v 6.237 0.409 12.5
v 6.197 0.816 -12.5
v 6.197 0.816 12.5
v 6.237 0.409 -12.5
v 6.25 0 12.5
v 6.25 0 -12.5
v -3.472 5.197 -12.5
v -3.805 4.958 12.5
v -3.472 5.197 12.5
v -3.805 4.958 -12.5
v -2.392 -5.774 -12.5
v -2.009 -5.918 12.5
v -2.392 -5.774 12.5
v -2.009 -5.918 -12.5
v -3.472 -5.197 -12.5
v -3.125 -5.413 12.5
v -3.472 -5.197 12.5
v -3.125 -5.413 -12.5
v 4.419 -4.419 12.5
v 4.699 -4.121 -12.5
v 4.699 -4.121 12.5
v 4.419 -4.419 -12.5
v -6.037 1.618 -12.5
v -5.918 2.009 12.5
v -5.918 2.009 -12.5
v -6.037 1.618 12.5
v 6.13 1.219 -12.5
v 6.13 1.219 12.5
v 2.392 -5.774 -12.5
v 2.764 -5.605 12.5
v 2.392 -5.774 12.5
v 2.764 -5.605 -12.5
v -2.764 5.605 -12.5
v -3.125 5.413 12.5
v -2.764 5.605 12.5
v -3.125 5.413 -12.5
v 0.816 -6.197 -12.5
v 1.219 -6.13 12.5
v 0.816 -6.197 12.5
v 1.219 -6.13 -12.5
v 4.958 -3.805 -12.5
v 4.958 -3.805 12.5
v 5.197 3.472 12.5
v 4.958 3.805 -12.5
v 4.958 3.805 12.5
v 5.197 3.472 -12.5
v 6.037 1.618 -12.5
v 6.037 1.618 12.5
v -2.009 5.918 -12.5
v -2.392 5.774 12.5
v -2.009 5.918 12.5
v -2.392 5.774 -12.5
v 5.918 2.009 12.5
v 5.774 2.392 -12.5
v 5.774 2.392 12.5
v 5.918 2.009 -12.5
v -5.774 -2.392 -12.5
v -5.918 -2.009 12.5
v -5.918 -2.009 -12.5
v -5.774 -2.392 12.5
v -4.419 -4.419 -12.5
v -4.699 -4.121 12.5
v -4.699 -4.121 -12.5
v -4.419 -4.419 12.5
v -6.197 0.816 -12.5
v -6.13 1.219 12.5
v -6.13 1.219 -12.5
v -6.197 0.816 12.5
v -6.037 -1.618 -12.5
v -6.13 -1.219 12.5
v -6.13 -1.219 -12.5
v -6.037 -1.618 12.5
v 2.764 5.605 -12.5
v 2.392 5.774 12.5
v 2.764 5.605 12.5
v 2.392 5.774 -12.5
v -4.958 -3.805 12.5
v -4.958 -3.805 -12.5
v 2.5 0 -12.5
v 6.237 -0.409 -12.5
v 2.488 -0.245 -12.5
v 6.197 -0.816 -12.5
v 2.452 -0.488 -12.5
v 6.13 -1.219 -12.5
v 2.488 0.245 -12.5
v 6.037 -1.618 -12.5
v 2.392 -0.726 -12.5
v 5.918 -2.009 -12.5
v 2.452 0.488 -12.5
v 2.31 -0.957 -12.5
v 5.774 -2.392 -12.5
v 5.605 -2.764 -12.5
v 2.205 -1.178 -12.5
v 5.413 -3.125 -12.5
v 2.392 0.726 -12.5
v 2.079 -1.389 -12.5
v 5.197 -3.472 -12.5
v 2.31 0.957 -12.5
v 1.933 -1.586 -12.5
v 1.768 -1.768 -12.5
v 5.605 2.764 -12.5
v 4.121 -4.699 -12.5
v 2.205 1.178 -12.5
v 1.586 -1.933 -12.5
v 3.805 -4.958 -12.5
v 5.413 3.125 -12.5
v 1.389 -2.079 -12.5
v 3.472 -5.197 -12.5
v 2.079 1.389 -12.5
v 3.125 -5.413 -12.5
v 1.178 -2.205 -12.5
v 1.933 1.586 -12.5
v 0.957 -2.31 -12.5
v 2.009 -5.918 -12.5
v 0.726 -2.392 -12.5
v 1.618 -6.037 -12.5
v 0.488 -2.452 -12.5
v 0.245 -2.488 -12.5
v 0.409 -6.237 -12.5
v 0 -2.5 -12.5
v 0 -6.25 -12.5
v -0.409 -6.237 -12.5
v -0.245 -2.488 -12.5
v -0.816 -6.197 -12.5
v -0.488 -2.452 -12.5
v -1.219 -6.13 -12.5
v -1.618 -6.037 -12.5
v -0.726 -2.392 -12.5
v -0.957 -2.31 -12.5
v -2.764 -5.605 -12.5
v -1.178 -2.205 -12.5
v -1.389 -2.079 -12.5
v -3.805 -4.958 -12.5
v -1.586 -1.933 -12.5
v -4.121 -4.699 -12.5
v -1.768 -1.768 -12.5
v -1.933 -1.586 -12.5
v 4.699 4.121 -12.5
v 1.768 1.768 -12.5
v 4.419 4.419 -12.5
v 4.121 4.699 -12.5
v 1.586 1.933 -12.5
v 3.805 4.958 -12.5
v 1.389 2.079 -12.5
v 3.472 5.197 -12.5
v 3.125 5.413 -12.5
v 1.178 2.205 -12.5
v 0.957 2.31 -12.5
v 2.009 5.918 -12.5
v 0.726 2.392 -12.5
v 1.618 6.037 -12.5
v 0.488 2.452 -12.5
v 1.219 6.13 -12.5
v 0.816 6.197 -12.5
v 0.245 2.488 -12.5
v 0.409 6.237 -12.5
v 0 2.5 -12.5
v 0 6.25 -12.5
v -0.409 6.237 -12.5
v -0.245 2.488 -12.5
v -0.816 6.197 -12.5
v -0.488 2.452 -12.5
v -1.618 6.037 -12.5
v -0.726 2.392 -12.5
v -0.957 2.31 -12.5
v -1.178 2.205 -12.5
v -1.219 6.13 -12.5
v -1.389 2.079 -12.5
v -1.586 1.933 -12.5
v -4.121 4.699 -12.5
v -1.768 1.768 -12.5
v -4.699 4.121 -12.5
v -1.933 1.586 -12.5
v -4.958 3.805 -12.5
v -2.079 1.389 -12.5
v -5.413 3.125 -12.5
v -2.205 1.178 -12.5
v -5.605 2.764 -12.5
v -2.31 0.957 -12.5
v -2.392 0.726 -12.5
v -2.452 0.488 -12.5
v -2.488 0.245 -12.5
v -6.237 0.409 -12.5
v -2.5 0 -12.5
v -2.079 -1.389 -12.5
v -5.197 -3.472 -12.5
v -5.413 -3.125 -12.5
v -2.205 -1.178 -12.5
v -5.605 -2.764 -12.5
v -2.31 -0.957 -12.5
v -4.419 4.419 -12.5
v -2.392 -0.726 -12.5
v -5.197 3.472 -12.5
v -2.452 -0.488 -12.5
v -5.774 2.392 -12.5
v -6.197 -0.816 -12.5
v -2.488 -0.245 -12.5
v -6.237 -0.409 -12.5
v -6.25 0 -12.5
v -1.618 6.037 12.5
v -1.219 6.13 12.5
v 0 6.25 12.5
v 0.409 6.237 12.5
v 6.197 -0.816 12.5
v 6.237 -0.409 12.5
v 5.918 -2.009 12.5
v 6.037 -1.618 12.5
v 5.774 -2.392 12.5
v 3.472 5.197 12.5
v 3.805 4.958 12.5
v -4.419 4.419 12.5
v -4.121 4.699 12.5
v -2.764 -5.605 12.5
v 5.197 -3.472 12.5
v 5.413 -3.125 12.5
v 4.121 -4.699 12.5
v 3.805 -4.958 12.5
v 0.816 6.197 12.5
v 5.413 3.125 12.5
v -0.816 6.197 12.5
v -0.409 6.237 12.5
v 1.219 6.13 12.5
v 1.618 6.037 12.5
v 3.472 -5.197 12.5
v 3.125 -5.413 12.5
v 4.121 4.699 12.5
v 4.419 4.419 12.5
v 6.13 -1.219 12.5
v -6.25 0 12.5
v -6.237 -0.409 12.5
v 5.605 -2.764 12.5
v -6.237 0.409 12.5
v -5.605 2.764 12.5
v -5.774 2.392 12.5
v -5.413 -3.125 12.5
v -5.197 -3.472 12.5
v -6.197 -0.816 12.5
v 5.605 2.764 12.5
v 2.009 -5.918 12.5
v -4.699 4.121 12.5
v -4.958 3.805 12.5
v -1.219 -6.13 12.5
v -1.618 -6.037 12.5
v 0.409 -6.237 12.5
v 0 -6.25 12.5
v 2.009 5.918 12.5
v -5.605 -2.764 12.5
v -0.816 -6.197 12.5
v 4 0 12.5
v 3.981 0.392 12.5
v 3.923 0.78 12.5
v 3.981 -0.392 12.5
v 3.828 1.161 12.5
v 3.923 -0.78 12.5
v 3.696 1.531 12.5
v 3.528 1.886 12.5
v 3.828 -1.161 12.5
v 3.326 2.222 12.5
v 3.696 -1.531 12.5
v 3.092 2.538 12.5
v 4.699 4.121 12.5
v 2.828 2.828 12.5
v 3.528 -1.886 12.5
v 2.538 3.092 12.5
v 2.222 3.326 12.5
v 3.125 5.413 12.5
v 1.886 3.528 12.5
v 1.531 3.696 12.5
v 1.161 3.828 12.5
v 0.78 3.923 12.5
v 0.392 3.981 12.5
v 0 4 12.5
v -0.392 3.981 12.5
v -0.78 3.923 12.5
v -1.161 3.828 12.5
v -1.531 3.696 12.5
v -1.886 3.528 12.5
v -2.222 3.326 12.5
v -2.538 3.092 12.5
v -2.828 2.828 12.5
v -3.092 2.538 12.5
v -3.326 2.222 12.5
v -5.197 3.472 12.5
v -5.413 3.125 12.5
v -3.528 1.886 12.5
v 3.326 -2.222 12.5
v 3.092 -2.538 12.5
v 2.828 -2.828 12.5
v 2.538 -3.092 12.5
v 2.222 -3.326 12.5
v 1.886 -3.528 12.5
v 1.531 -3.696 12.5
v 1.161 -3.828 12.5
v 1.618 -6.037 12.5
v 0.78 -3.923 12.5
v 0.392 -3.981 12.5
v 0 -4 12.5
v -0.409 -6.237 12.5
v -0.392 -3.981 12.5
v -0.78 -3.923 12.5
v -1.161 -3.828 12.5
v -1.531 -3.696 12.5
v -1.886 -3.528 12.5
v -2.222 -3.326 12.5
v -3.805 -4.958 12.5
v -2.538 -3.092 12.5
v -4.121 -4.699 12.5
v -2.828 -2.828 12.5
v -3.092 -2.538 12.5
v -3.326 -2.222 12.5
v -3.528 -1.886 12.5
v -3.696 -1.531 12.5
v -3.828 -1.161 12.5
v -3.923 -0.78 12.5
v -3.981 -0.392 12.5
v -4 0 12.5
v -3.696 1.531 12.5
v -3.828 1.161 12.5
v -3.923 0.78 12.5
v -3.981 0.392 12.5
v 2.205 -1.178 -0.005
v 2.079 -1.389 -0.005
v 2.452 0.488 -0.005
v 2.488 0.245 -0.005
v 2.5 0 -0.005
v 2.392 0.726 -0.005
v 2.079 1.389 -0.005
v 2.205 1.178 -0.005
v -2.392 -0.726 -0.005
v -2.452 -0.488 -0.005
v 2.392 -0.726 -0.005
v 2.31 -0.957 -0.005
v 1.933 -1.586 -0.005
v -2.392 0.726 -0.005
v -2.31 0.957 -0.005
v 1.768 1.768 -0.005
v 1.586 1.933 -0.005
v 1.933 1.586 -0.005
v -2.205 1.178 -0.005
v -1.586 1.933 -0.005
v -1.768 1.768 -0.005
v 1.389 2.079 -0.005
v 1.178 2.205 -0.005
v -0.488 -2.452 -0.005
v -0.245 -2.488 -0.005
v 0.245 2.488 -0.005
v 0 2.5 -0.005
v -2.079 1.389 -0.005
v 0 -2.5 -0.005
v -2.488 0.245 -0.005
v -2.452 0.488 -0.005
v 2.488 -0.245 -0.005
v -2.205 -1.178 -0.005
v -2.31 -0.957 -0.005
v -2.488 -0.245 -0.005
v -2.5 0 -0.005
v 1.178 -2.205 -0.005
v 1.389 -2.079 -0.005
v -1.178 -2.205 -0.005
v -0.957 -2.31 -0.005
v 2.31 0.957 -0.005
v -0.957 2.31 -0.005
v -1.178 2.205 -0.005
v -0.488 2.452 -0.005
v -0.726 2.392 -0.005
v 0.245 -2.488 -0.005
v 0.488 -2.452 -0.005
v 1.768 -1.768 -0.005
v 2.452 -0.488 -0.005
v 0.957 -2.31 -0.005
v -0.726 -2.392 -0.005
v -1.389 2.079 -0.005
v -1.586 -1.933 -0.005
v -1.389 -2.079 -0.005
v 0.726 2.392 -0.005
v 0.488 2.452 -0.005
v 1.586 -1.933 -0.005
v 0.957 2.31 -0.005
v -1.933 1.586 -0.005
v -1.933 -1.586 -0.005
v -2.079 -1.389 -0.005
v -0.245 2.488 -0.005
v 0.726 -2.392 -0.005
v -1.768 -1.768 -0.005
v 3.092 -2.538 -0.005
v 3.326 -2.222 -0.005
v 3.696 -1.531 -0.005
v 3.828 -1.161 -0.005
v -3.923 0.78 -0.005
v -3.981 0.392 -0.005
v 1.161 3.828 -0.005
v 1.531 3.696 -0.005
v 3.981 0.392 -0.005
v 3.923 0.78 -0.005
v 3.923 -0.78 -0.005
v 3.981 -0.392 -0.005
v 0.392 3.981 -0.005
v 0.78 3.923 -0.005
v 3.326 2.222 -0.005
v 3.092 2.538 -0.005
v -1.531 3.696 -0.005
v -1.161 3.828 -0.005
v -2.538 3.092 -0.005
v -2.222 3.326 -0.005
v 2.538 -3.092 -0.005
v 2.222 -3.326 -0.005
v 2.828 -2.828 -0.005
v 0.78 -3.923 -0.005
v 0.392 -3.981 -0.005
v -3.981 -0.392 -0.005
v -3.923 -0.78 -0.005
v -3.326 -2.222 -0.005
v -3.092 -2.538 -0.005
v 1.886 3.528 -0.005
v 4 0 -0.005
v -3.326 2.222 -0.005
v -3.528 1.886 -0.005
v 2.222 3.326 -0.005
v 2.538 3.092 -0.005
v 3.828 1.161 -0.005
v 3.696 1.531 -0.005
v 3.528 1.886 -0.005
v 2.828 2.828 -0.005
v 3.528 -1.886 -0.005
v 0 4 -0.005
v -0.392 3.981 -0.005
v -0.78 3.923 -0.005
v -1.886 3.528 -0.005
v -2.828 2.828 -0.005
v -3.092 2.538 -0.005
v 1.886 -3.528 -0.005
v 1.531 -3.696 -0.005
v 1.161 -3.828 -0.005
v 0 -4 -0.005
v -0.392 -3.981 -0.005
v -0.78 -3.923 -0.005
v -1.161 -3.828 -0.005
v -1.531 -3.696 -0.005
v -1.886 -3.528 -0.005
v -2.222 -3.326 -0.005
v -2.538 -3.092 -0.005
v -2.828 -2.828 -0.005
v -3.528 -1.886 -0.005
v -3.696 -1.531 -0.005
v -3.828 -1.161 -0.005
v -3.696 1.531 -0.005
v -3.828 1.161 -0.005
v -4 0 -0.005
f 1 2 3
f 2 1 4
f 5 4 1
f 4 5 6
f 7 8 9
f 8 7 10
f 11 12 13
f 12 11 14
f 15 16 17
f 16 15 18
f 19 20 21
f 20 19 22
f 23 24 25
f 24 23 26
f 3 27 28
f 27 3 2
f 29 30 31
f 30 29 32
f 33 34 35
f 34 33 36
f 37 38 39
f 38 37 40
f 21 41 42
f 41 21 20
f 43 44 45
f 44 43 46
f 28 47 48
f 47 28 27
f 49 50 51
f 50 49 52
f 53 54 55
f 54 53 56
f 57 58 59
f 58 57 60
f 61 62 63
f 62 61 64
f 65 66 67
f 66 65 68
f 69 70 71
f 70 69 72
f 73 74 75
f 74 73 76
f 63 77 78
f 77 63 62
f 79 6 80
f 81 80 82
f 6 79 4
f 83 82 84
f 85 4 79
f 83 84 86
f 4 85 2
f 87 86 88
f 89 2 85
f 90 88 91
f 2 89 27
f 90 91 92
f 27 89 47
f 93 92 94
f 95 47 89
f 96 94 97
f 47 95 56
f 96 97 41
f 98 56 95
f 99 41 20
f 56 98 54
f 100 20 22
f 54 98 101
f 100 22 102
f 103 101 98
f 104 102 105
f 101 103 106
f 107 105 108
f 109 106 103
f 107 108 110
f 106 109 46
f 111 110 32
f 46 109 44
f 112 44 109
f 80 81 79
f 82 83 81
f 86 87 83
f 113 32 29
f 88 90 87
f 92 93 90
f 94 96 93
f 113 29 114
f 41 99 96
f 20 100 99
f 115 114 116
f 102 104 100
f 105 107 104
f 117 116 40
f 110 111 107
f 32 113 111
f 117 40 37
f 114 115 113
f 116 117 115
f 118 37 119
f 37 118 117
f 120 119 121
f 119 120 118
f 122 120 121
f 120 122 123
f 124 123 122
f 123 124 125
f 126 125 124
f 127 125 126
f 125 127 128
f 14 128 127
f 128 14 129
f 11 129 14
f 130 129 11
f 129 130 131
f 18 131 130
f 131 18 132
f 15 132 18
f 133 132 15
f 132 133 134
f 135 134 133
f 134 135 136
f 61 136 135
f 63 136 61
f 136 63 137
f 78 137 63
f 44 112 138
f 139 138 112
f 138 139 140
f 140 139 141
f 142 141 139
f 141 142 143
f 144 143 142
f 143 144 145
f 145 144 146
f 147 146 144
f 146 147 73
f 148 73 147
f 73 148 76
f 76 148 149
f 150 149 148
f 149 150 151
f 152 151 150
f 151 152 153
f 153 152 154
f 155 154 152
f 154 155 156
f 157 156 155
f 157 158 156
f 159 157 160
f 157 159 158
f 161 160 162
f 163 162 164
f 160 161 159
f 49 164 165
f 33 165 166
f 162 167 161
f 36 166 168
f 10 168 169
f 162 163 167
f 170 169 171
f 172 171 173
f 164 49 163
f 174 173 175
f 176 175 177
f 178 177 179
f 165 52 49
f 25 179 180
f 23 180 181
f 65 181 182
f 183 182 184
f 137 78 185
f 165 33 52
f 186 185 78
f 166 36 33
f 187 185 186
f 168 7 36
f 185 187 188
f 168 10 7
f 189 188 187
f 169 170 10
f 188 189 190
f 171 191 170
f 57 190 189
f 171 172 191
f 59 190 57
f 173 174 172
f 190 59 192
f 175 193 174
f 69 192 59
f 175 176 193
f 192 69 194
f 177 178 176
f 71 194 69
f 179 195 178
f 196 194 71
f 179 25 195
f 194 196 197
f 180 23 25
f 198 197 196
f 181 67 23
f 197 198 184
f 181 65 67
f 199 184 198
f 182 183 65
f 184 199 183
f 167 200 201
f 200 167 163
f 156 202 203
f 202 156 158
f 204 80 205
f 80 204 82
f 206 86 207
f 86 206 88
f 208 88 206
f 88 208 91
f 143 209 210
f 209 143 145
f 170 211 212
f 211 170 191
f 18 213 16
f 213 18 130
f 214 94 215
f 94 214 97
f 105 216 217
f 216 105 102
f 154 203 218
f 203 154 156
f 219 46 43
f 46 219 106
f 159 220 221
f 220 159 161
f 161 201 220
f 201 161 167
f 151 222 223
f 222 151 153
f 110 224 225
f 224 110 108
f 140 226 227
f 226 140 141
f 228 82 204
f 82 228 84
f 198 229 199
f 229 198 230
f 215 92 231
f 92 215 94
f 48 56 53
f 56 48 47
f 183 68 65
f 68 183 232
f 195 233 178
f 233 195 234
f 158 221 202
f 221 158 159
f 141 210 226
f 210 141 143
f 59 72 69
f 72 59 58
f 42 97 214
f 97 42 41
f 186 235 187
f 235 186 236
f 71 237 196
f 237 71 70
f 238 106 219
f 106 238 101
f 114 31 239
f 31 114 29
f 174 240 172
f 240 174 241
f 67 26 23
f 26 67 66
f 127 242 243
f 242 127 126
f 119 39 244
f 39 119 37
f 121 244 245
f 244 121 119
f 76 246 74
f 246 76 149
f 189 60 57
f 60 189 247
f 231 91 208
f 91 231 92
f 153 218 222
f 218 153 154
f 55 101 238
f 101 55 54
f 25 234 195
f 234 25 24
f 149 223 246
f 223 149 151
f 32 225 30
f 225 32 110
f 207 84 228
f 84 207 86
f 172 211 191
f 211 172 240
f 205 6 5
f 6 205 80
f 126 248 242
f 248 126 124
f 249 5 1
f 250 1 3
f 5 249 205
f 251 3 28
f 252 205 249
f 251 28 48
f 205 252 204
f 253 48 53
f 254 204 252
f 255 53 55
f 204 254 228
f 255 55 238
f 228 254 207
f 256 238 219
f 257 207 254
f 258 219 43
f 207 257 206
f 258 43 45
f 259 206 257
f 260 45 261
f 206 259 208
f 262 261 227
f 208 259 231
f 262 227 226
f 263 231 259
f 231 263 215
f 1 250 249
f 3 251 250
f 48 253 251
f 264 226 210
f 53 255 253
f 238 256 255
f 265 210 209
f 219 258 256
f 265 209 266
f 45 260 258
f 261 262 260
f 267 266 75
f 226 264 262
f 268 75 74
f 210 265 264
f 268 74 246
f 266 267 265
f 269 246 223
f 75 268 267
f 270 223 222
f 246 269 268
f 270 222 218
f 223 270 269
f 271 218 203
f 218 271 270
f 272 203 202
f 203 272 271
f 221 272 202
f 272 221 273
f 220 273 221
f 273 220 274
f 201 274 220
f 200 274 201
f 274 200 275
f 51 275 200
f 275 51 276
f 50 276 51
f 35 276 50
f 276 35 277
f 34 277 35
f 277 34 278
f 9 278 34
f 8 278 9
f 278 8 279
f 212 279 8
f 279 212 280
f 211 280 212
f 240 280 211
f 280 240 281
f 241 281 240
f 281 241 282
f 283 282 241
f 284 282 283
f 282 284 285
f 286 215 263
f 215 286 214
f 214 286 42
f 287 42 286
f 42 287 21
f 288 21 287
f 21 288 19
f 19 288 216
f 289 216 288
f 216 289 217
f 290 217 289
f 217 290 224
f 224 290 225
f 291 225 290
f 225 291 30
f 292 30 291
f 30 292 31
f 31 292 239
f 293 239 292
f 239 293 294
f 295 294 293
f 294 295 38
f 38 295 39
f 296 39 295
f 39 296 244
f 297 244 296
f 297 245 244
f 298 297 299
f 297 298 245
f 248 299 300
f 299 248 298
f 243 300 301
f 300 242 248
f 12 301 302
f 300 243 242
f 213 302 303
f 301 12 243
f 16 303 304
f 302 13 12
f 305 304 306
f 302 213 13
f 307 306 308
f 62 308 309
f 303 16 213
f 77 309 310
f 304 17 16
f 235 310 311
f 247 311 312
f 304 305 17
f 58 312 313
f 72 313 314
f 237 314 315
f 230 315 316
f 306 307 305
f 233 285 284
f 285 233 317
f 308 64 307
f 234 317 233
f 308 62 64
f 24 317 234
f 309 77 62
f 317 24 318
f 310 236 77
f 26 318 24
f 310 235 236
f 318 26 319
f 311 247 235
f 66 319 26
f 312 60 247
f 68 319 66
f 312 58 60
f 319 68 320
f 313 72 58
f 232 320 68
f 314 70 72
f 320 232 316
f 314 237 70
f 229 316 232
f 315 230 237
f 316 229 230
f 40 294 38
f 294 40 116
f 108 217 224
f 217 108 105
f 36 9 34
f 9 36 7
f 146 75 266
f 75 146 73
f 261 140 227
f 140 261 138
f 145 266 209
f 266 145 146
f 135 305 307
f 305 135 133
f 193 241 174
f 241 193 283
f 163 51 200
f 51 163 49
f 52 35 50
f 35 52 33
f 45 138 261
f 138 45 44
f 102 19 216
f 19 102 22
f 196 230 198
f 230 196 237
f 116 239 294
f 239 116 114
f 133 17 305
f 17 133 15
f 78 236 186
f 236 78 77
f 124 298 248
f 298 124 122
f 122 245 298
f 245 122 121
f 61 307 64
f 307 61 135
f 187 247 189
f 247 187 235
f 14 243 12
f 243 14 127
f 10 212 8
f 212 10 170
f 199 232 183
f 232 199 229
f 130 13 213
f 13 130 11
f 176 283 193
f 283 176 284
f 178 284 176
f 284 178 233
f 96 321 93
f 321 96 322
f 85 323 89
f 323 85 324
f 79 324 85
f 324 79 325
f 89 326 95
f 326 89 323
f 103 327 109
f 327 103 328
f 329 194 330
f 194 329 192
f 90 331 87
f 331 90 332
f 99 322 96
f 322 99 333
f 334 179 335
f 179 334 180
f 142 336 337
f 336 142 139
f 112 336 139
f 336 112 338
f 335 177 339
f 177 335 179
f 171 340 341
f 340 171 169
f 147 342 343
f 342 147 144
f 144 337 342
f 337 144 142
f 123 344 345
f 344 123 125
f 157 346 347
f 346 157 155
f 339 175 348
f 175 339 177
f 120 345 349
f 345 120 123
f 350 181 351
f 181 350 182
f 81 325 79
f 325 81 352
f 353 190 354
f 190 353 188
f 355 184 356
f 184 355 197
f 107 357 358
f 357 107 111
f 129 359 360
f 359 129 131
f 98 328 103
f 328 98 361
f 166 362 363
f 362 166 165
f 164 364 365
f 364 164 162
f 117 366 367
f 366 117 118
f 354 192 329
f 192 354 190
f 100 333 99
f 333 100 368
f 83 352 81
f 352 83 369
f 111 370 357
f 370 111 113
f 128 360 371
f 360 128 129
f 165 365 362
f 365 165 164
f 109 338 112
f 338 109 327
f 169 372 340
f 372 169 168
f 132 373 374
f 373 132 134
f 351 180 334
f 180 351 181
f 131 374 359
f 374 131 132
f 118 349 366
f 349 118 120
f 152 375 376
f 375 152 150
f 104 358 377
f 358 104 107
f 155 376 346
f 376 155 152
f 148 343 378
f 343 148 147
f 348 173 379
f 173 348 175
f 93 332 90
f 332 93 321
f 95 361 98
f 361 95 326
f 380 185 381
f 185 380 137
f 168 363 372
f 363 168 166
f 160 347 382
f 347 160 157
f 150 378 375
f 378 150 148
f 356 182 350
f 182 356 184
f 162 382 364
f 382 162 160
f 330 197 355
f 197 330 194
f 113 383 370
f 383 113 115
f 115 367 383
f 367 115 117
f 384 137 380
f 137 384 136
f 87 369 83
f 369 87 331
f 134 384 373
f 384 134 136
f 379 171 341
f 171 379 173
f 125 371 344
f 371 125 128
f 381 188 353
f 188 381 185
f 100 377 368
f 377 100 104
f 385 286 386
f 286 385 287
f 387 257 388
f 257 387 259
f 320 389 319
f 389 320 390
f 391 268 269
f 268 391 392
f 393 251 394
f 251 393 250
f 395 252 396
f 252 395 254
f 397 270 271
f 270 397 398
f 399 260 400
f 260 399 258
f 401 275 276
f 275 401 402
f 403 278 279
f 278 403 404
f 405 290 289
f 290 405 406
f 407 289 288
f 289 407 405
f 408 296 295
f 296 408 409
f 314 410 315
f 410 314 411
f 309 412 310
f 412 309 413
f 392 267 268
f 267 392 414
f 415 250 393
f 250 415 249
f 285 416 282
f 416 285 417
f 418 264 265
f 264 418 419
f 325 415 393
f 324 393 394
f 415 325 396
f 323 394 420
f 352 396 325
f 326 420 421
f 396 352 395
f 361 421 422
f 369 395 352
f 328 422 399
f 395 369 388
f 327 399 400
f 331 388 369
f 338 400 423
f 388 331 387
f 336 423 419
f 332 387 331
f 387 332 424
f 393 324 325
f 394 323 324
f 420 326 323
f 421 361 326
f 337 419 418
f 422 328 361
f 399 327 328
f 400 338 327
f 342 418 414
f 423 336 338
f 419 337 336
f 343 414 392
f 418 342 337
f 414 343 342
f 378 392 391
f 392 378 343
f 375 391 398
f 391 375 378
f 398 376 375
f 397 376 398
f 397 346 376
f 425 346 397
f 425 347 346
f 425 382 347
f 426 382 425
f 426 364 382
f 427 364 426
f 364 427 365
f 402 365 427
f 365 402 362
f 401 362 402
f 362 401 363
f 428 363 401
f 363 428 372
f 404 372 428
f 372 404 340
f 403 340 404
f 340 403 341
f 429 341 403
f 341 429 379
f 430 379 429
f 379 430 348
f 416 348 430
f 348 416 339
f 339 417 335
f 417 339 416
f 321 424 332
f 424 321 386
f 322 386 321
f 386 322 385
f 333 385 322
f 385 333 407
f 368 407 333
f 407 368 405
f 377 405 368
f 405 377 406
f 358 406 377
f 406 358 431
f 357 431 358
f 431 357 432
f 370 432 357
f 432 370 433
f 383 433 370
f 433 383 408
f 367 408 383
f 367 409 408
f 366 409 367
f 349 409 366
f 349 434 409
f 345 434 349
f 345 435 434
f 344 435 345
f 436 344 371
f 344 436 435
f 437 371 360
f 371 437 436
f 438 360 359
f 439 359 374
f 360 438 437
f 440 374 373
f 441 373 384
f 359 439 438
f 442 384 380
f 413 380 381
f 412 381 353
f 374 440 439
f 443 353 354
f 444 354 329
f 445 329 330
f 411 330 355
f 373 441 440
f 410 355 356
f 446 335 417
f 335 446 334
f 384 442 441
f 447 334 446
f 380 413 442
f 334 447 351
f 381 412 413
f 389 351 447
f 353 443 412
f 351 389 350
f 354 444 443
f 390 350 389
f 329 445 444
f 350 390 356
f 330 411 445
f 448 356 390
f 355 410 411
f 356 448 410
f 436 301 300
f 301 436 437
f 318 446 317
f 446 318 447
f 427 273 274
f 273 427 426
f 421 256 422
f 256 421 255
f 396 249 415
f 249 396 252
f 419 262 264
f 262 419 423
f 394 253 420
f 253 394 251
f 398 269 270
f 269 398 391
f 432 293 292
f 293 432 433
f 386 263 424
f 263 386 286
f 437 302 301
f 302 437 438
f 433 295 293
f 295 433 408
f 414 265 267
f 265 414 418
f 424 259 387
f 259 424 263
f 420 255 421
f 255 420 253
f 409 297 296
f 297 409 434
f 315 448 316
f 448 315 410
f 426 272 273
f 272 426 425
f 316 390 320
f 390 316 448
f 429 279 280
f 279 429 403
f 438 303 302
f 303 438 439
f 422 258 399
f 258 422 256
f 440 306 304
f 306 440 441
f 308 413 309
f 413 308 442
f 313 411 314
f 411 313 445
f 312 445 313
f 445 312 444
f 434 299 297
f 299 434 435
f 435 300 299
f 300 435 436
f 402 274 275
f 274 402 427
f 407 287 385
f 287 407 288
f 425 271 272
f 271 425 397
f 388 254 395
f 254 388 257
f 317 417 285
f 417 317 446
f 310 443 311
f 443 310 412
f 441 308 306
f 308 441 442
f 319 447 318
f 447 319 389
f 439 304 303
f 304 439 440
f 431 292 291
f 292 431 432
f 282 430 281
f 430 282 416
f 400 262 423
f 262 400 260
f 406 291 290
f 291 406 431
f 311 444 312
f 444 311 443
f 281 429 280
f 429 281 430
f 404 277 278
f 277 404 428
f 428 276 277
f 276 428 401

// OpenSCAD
// Rigid shaft coupling: 5.0mm to 8.0mm bore, 12.5mm OD, 25.0mm long

// Parameters
outer_diameter_mm = 12.5; //[6.25:25:0.1]
length_mm = 25; //[12.5:50:0.1]
bore1_diameter_mm = 5; //[2.5:10:0.1]
bore2_diameter_mm = 8; //[4:16:0.1]
bore1_depth_mm = 12.5; //[6.25:25:0.1]
bore2_depth_mm = 12.5; //[6.25:25:0.1]
overlap_mm = 0.5; //[0.1:2:0.1]

// Shaft Coupling - complete geometry
module shaft_coupling() {
    // Ensure depths don't exceed length
    b1 = min(bore1_depth_mm, length_mm);
    b2 = min(bore2_depth_mm, length_mm);

    // Small epsilon to avoid coplanar/zero-thickness artifacts
    eps = 0.01;

    color("Silver")
    difference() {
        // Body
        cylinder(d=outer_diameter_mm, h=length_mm, center=true, $fn=96);

        // Bore 1 (5mm) from the -Z end inward
        translate([0, 0, -length_mm/2 + b1/2 - overlap_mm/2])
            cylinder(d=bore1_diameter_mm, h=b1 + overlap_mm + eps, center=true, $fn=64);

        // Bore 2 (8mm) from the +Z end inward
        translate([0, 0,  length_mm/2 - b2/2 + overlap_mm/2])
            cylinder(d=bore2_diameter_mm, h=b2 + overlap_mm + eps, center=true, $fn=64);
    }
}

// Assembly
shaft_coupling();
